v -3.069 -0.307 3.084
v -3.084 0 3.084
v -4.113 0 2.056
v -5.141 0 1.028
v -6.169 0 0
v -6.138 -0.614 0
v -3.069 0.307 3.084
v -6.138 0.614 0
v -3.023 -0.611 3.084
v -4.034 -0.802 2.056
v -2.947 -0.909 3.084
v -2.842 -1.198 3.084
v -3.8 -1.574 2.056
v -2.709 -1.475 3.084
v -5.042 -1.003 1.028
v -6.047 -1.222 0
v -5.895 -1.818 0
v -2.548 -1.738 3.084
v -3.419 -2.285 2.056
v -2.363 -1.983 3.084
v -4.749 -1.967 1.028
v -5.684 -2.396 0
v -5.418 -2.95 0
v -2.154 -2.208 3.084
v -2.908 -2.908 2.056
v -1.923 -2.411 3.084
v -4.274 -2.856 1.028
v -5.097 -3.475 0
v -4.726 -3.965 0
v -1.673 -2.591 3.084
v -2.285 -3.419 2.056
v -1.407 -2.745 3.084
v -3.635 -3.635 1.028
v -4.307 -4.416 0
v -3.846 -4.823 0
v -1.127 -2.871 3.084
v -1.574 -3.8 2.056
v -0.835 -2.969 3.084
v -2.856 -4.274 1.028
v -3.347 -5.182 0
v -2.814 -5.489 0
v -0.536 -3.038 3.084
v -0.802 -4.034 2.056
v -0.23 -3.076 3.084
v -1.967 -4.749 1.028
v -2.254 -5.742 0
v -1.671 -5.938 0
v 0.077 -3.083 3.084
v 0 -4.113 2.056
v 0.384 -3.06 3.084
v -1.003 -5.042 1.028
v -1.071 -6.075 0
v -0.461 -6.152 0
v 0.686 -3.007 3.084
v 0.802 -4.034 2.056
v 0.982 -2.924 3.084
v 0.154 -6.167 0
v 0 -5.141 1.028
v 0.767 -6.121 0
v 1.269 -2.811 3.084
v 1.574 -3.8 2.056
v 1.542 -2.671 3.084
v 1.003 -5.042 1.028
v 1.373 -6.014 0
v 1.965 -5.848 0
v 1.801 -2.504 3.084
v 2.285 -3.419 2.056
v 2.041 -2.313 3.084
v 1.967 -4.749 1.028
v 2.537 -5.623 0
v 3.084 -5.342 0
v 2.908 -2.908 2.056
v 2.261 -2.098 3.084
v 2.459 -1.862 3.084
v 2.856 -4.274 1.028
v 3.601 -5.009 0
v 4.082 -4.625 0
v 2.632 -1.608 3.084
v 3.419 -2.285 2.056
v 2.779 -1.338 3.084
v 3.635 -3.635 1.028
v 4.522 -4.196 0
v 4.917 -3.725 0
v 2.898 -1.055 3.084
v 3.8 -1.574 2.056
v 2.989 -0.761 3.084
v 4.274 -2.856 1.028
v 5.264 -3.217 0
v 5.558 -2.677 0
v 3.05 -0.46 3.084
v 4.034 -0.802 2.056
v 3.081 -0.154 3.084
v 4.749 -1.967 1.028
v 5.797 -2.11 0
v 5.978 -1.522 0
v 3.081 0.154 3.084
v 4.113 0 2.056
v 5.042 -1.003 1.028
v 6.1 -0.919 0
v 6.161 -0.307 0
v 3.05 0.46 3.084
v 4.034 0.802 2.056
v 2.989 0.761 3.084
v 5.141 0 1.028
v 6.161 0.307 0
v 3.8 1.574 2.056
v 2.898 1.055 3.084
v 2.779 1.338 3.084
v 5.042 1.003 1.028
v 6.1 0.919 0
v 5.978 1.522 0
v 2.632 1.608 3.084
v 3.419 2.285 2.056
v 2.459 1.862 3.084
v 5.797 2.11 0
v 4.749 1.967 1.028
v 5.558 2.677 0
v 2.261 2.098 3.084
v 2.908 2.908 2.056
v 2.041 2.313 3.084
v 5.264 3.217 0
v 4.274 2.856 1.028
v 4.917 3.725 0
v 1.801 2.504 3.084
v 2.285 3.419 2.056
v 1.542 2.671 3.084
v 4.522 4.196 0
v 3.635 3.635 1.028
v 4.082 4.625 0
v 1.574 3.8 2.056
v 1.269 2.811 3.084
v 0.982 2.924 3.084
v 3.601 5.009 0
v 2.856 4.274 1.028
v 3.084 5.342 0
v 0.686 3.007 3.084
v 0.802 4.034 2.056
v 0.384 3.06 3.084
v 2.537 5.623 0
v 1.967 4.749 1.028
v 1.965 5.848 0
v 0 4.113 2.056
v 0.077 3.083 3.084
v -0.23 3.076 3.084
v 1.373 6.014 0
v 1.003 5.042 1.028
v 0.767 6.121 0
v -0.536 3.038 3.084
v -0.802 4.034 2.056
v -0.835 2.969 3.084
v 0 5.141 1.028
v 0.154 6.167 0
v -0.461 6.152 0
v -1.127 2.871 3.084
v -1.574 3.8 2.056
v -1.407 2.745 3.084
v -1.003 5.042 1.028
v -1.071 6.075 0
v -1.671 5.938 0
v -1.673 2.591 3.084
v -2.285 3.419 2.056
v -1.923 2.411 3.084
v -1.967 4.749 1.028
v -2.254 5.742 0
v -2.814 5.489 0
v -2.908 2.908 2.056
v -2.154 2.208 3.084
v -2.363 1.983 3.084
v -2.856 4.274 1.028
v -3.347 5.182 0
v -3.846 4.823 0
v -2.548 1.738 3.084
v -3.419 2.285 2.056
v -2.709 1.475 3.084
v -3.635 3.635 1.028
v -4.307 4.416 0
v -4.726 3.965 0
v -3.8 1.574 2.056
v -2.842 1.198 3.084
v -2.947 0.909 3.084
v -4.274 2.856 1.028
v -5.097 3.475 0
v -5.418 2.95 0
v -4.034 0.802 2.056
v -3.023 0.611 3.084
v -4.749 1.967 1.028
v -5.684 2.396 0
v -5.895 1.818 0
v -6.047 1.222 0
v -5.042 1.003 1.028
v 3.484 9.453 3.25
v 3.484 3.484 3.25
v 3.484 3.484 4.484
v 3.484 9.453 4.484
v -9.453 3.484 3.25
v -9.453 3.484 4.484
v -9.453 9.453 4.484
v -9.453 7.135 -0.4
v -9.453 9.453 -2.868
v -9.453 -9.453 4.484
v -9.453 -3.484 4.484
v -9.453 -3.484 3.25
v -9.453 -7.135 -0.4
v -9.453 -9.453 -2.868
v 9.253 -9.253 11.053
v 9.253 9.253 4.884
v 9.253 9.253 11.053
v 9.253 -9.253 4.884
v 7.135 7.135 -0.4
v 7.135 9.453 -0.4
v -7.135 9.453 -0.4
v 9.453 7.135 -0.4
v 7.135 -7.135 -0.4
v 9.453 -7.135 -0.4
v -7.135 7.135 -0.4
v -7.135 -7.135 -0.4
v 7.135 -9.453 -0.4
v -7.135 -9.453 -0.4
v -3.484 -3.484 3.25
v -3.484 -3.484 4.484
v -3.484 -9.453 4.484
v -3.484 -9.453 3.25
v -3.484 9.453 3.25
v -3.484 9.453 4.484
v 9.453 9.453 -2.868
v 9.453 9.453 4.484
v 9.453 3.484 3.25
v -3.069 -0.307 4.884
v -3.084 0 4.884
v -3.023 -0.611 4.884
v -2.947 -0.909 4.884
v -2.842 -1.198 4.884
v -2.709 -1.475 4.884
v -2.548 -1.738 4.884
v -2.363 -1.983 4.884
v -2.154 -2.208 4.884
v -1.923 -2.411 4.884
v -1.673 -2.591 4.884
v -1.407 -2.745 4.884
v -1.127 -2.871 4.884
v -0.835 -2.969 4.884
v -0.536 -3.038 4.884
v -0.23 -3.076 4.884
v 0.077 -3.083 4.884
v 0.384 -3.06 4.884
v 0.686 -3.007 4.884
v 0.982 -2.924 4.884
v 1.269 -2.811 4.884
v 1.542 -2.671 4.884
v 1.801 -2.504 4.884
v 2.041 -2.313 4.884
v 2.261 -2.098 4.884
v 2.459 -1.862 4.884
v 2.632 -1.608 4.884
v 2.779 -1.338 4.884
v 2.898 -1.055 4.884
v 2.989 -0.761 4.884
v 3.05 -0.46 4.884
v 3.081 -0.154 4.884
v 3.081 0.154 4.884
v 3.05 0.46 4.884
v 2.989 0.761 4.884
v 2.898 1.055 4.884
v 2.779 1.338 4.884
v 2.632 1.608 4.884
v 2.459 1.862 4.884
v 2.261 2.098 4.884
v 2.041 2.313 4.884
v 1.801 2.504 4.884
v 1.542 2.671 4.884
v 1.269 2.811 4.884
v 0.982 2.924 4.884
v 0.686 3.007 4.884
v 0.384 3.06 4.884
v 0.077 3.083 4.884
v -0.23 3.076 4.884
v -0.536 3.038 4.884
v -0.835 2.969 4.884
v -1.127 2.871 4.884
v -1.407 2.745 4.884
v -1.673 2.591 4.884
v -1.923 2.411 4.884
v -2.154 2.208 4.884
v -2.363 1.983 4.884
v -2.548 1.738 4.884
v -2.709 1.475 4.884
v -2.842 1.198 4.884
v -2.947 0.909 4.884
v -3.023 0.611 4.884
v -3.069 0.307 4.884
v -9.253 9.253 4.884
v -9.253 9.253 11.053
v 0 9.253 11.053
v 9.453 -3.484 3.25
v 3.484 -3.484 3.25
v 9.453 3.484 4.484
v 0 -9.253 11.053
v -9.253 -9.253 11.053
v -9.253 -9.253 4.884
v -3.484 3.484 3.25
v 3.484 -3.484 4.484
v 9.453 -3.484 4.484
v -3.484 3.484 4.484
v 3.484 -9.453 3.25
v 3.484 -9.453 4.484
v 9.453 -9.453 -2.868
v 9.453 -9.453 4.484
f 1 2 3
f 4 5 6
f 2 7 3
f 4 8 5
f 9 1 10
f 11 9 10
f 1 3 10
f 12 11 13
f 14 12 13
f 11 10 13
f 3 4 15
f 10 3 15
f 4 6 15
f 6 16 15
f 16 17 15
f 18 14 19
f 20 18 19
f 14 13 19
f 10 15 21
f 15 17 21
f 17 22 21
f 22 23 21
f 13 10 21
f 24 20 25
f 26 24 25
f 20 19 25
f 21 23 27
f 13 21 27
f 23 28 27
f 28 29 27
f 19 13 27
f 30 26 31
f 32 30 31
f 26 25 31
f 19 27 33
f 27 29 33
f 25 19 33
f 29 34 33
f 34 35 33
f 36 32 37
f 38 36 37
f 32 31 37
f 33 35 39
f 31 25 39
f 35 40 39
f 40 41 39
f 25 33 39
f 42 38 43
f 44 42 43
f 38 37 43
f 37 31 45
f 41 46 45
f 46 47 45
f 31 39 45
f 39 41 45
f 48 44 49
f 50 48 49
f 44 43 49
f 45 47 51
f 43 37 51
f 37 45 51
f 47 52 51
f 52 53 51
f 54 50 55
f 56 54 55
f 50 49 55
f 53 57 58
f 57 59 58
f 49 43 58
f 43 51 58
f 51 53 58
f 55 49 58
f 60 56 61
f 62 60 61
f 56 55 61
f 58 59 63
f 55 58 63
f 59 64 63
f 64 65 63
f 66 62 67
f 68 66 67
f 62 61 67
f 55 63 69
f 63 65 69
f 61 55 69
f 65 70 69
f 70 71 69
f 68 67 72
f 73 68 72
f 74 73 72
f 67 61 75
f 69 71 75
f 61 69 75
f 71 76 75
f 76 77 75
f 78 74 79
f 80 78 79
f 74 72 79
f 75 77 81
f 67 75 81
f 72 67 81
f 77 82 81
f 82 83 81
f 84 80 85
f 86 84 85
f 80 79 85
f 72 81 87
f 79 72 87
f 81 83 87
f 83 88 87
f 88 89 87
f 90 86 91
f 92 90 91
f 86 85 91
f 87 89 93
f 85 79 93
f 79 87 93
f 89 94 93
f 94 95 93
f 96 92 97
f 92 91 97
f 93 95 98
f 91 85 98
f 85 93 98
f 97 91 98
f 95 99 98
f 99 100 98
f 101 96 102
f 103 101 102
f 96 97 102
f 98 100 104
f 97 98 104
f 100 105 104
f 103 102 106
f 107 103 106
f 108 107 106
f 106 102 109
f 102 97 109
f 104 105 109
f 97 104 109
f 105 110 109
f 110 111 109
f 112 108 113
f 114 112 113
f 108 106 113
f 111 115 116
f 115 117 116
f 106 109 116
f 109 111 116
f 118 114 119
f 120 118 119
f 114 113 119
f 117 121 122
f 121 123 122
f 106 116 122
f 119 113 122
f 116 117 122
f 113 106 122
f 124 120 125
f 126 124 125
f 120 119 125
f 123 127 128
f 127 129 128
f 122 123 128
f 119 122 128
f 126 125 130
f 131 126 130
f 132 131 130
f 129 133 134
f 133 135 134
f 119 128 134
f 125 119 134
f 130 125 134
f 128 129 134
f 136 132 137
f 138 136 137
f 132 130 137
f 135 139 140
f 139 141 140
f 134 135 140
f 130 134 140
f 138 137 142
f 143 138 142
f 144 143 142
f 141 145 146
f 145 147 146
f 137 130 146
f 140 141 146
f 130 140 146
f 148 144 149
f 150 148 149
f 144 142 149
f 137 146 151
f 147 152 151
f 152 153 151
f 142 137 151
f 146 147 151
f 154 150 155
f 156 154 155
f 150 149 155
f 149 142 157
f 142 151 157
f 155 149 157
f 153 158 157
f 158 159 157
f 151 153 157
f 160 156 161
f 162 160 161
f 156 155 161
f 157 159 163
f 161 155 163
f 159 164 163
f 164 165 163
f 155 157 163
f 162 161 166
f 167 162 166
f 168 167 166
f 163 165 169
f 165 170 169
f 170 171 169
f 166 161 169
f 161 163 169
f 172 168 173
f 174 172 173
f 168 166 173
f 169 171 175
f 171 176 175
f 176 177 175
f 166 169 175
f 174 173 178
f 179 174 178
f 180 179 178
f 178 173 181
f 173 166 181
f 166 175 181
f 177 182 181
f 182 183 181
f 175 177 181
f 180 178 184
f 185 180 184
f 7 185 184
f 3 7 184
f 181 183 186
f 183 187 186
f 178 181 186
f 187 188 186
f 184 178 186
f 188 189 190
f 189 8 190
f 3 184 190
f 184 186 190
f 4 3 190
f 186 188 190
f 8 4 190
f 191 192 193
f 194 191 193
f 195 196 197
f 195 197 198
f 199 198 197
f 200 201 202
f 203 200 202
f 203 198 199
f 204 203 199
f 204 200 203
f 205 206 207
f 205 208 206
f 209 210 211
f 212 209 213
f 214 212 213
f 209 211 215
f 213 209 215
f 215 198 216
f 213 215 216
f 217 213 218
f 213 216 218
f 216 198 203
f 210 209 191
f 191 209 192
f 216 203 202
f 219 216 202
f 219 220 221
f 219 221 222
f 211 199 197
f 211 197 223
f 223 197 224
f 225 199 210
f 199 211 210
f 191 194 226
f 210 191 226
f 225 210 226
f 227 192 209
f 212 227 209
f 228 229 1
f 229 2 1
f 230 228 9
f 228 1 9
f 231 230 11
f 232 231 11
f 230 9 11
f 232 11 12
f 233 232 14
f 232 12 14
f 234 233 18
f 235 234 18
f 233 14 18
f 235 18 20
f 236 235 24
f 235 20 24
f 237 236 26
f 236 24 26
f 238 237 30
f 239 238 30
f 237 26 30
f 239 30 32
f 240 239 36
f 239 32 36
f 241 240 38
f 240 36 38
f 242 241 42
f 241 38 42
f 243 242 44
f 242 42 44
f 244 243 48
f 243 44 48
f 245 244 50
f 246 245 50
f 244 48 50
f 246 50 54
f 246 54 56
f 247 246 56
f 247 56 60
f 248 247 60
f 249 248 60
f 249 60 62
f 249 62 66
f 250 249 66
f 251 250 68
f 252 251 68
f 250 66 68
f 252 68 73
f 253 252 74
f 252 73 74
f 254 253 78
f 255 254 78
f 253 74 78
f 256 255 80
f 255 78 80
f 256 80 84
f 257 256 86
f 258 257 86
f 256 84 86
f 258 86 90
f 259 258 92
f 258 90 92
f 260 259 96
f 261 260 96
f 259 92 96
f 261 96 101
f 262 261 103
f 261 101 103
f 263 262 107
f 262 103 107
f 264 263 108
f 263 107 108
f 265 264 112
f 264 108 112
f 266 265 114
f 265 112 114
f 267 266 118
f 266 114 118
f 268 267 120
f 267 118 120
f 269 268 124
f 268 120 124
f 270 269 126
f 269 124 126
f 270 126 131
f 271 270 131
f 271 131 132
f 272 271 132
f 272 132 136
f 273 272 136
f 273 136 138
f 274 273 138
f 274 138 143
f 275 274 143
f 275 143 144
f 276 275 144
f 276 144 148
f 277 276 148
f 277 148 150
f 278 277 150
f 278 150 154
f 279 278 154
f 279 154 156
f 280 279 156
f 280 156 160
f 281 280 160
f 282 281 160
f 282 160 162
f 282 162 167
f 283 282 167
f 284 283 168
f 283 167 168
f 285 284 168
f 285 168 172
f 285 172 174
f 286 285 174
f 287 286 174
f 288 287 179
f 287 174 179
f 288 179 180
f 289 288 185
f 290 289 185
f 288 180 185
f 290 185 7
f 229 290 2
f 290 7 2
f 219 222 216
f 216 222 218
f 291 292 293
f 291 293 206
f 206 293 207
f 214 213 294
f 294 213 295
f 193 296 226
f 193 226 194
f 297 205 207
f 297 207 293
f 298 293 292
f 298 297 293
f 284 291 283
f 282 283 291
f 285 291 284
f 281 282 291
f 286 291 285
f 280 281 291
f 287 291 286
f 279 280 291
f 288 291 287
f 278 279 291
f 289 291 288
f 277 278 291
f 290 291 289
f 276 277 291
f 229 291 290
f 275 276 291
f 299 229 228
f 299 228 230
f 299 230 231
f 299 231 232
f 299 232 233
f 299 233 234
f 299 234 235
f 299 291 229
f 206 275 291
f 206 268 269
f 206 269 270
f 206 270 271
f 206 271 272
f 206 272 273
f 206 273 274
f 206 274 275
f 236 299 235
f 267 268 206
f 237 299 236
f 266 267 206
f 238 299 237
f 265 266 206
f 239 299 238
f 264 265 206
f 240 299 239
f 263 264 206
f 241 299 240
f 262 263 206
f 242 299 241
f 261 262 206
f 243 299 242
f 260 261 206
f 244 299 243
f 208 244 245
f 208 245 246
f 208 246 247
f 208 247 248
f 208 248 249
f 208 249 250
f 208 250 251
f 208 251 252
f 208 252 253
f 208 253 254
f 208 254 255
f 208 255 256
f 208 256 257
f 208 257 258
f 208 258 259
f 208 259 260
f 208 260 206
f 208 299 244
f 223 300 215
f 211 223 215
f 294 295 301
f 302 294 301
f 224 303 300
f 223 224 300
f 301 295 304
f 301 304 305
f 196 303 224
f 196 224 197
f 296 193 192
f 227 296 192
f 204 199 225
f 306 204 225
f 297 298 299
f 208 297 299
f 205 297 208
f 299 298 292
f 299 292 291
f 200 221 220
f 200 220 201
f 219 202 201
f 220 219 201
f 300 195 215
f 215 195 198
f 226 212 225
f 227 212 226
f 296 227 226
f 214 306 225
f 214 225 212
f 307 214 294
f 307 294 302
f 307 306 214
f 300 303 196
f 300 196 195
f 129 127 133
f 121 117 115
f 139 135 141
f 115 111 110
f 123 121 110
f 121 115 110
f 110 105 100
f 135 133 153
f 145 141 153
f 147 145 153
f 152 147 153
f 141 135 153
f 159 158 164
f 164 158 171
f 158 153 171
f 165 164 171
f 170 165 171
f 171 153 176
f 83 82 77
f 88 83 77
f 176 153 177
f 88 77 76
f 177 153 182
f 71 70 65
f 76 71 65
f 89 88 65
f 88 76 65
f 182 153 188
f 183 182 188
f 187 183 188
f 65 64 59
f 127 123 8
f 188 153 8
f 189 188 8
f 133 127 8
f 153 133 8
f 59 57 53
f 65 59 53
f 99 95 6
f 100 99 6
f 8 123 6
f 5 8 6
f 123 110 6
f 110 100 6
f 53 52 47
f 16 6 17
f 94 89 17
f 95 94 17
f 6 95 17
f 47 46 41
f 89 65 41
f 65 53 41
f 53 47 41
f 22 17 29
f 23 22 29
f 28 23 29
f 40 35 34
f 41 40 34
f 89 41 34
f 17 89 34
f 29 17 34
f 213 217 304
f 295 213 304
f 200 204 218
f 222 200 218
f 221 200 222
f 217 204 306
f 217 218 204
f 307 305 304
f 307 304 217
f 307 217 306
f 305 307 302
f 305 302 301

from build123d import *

# Parameters (mm, degrees)
F3_W      = 9.2532467532
F3_H      = 6.1688311688
F4_DEPTH  = 9.2532467532
F7_DEPTH  = 9.4532467532
F8_DEPTH  = 12.3376623377
F10_ANGLE = 90


with BuildPart() as f4:
    # F3 (on Front) → F4 (new body, symmetric)
    with BuildSketch(Plane.XZ):
        Polygon((-3.0844155844, 4.8838672431), (0, 4.8838672431), (0, 11.052698412), (-9.2532467532, 11.052698412), (-9.2532467532, 4.8838672431), align=None)
        with Locations((4.6266233766, 7.9682828275)):
            Rectangle(F3_W, F3_H)
    extrude(amount=F4_DEPTH, both=True)

    # F3 (on Front) → F5 (revolve)
    with BuildSketch(Plane.XZ):
        Polygon((0, 0), (0, 4.8838672431), (-3.0844155844, 4.8838672431), (-3.0844155844, 3.0844155844), (-6.1688311688, 0), align=None)
    revolve(axis=Axis((0, 0, 2.4419336216), (0, 0, 1)))


with BuildPart() as f7:
    # F6 (on Front) → F7 (new body, symmetric)
    with BuildSketch(Plane.XZ):
        Polygon((-3.4844155844, 3.2501010094), (-3.4844155844, 4.4838672431), (-9.4532467532, 4.4838672431), (-9.4532467532, -2.8675324675), (9.4532467532, -2.8675324675), (9.4532467532, 4.4838672431), (3.4844155844, 4.4838672431), (3.4844155844, 3.2501010094), (7.1345165938, -0.4), (0, -0.4), (-7.1345165938, -0.4), align=None)
        Polygon((3.4844155844, 4.4838672431), (0, 4.4838672431), (0, -0.4), (7.1345165938, -0.4), (3.4844155844, 3.2501010094), align=None)
        Polygon((0, 4.4838672431), (-3.4844155844, 4.4838672431), (-3.4844155844, 3.2501010094), (-7.1345165938, -0.4), (0, -0.4), align=None)
    extrude(amount=F7_DEPTH, both=True)


with BuildPart() as f8:
    # F6 (on Front) → F8 (new body, symmetric)
    with BuildSketch(Plane.XZ):
        Polygon((0, 4.4838672431), (-3.4844155844, 4.4838672431), (-3.4844155844, 3.2501010094), (-7.1345165938, -0.4), (0, -0.4), align=None)
        Polygon((3.4844155844, 4.4838672431), (0, 4.4838672431), (0, -0.4), (7.1345165938, -0.4), (3.4844155844, 3.2501010094), align=None)
    extrude(amount=F8_DEPTH, both=True)


with BuildPart() as f7_1:
    add(f7.part)

    # F9: cut F8
    add(f8.part, mode=Mode.SUBTRACT)


with BuildPart() as f8_1:
    # F10: moved
    add(f8.part.rotate(Axis((0, 0, 2.0419336216), (0, 0, -1)), F10_ANGLE))


with BuildPart() as f7_2:
    add(f7_1.part)

    # F11: cut F8
    add(f8_1.part, mode=Mode.SUBTRACT)


solid = Compound([f4.part, f7_2.part])
